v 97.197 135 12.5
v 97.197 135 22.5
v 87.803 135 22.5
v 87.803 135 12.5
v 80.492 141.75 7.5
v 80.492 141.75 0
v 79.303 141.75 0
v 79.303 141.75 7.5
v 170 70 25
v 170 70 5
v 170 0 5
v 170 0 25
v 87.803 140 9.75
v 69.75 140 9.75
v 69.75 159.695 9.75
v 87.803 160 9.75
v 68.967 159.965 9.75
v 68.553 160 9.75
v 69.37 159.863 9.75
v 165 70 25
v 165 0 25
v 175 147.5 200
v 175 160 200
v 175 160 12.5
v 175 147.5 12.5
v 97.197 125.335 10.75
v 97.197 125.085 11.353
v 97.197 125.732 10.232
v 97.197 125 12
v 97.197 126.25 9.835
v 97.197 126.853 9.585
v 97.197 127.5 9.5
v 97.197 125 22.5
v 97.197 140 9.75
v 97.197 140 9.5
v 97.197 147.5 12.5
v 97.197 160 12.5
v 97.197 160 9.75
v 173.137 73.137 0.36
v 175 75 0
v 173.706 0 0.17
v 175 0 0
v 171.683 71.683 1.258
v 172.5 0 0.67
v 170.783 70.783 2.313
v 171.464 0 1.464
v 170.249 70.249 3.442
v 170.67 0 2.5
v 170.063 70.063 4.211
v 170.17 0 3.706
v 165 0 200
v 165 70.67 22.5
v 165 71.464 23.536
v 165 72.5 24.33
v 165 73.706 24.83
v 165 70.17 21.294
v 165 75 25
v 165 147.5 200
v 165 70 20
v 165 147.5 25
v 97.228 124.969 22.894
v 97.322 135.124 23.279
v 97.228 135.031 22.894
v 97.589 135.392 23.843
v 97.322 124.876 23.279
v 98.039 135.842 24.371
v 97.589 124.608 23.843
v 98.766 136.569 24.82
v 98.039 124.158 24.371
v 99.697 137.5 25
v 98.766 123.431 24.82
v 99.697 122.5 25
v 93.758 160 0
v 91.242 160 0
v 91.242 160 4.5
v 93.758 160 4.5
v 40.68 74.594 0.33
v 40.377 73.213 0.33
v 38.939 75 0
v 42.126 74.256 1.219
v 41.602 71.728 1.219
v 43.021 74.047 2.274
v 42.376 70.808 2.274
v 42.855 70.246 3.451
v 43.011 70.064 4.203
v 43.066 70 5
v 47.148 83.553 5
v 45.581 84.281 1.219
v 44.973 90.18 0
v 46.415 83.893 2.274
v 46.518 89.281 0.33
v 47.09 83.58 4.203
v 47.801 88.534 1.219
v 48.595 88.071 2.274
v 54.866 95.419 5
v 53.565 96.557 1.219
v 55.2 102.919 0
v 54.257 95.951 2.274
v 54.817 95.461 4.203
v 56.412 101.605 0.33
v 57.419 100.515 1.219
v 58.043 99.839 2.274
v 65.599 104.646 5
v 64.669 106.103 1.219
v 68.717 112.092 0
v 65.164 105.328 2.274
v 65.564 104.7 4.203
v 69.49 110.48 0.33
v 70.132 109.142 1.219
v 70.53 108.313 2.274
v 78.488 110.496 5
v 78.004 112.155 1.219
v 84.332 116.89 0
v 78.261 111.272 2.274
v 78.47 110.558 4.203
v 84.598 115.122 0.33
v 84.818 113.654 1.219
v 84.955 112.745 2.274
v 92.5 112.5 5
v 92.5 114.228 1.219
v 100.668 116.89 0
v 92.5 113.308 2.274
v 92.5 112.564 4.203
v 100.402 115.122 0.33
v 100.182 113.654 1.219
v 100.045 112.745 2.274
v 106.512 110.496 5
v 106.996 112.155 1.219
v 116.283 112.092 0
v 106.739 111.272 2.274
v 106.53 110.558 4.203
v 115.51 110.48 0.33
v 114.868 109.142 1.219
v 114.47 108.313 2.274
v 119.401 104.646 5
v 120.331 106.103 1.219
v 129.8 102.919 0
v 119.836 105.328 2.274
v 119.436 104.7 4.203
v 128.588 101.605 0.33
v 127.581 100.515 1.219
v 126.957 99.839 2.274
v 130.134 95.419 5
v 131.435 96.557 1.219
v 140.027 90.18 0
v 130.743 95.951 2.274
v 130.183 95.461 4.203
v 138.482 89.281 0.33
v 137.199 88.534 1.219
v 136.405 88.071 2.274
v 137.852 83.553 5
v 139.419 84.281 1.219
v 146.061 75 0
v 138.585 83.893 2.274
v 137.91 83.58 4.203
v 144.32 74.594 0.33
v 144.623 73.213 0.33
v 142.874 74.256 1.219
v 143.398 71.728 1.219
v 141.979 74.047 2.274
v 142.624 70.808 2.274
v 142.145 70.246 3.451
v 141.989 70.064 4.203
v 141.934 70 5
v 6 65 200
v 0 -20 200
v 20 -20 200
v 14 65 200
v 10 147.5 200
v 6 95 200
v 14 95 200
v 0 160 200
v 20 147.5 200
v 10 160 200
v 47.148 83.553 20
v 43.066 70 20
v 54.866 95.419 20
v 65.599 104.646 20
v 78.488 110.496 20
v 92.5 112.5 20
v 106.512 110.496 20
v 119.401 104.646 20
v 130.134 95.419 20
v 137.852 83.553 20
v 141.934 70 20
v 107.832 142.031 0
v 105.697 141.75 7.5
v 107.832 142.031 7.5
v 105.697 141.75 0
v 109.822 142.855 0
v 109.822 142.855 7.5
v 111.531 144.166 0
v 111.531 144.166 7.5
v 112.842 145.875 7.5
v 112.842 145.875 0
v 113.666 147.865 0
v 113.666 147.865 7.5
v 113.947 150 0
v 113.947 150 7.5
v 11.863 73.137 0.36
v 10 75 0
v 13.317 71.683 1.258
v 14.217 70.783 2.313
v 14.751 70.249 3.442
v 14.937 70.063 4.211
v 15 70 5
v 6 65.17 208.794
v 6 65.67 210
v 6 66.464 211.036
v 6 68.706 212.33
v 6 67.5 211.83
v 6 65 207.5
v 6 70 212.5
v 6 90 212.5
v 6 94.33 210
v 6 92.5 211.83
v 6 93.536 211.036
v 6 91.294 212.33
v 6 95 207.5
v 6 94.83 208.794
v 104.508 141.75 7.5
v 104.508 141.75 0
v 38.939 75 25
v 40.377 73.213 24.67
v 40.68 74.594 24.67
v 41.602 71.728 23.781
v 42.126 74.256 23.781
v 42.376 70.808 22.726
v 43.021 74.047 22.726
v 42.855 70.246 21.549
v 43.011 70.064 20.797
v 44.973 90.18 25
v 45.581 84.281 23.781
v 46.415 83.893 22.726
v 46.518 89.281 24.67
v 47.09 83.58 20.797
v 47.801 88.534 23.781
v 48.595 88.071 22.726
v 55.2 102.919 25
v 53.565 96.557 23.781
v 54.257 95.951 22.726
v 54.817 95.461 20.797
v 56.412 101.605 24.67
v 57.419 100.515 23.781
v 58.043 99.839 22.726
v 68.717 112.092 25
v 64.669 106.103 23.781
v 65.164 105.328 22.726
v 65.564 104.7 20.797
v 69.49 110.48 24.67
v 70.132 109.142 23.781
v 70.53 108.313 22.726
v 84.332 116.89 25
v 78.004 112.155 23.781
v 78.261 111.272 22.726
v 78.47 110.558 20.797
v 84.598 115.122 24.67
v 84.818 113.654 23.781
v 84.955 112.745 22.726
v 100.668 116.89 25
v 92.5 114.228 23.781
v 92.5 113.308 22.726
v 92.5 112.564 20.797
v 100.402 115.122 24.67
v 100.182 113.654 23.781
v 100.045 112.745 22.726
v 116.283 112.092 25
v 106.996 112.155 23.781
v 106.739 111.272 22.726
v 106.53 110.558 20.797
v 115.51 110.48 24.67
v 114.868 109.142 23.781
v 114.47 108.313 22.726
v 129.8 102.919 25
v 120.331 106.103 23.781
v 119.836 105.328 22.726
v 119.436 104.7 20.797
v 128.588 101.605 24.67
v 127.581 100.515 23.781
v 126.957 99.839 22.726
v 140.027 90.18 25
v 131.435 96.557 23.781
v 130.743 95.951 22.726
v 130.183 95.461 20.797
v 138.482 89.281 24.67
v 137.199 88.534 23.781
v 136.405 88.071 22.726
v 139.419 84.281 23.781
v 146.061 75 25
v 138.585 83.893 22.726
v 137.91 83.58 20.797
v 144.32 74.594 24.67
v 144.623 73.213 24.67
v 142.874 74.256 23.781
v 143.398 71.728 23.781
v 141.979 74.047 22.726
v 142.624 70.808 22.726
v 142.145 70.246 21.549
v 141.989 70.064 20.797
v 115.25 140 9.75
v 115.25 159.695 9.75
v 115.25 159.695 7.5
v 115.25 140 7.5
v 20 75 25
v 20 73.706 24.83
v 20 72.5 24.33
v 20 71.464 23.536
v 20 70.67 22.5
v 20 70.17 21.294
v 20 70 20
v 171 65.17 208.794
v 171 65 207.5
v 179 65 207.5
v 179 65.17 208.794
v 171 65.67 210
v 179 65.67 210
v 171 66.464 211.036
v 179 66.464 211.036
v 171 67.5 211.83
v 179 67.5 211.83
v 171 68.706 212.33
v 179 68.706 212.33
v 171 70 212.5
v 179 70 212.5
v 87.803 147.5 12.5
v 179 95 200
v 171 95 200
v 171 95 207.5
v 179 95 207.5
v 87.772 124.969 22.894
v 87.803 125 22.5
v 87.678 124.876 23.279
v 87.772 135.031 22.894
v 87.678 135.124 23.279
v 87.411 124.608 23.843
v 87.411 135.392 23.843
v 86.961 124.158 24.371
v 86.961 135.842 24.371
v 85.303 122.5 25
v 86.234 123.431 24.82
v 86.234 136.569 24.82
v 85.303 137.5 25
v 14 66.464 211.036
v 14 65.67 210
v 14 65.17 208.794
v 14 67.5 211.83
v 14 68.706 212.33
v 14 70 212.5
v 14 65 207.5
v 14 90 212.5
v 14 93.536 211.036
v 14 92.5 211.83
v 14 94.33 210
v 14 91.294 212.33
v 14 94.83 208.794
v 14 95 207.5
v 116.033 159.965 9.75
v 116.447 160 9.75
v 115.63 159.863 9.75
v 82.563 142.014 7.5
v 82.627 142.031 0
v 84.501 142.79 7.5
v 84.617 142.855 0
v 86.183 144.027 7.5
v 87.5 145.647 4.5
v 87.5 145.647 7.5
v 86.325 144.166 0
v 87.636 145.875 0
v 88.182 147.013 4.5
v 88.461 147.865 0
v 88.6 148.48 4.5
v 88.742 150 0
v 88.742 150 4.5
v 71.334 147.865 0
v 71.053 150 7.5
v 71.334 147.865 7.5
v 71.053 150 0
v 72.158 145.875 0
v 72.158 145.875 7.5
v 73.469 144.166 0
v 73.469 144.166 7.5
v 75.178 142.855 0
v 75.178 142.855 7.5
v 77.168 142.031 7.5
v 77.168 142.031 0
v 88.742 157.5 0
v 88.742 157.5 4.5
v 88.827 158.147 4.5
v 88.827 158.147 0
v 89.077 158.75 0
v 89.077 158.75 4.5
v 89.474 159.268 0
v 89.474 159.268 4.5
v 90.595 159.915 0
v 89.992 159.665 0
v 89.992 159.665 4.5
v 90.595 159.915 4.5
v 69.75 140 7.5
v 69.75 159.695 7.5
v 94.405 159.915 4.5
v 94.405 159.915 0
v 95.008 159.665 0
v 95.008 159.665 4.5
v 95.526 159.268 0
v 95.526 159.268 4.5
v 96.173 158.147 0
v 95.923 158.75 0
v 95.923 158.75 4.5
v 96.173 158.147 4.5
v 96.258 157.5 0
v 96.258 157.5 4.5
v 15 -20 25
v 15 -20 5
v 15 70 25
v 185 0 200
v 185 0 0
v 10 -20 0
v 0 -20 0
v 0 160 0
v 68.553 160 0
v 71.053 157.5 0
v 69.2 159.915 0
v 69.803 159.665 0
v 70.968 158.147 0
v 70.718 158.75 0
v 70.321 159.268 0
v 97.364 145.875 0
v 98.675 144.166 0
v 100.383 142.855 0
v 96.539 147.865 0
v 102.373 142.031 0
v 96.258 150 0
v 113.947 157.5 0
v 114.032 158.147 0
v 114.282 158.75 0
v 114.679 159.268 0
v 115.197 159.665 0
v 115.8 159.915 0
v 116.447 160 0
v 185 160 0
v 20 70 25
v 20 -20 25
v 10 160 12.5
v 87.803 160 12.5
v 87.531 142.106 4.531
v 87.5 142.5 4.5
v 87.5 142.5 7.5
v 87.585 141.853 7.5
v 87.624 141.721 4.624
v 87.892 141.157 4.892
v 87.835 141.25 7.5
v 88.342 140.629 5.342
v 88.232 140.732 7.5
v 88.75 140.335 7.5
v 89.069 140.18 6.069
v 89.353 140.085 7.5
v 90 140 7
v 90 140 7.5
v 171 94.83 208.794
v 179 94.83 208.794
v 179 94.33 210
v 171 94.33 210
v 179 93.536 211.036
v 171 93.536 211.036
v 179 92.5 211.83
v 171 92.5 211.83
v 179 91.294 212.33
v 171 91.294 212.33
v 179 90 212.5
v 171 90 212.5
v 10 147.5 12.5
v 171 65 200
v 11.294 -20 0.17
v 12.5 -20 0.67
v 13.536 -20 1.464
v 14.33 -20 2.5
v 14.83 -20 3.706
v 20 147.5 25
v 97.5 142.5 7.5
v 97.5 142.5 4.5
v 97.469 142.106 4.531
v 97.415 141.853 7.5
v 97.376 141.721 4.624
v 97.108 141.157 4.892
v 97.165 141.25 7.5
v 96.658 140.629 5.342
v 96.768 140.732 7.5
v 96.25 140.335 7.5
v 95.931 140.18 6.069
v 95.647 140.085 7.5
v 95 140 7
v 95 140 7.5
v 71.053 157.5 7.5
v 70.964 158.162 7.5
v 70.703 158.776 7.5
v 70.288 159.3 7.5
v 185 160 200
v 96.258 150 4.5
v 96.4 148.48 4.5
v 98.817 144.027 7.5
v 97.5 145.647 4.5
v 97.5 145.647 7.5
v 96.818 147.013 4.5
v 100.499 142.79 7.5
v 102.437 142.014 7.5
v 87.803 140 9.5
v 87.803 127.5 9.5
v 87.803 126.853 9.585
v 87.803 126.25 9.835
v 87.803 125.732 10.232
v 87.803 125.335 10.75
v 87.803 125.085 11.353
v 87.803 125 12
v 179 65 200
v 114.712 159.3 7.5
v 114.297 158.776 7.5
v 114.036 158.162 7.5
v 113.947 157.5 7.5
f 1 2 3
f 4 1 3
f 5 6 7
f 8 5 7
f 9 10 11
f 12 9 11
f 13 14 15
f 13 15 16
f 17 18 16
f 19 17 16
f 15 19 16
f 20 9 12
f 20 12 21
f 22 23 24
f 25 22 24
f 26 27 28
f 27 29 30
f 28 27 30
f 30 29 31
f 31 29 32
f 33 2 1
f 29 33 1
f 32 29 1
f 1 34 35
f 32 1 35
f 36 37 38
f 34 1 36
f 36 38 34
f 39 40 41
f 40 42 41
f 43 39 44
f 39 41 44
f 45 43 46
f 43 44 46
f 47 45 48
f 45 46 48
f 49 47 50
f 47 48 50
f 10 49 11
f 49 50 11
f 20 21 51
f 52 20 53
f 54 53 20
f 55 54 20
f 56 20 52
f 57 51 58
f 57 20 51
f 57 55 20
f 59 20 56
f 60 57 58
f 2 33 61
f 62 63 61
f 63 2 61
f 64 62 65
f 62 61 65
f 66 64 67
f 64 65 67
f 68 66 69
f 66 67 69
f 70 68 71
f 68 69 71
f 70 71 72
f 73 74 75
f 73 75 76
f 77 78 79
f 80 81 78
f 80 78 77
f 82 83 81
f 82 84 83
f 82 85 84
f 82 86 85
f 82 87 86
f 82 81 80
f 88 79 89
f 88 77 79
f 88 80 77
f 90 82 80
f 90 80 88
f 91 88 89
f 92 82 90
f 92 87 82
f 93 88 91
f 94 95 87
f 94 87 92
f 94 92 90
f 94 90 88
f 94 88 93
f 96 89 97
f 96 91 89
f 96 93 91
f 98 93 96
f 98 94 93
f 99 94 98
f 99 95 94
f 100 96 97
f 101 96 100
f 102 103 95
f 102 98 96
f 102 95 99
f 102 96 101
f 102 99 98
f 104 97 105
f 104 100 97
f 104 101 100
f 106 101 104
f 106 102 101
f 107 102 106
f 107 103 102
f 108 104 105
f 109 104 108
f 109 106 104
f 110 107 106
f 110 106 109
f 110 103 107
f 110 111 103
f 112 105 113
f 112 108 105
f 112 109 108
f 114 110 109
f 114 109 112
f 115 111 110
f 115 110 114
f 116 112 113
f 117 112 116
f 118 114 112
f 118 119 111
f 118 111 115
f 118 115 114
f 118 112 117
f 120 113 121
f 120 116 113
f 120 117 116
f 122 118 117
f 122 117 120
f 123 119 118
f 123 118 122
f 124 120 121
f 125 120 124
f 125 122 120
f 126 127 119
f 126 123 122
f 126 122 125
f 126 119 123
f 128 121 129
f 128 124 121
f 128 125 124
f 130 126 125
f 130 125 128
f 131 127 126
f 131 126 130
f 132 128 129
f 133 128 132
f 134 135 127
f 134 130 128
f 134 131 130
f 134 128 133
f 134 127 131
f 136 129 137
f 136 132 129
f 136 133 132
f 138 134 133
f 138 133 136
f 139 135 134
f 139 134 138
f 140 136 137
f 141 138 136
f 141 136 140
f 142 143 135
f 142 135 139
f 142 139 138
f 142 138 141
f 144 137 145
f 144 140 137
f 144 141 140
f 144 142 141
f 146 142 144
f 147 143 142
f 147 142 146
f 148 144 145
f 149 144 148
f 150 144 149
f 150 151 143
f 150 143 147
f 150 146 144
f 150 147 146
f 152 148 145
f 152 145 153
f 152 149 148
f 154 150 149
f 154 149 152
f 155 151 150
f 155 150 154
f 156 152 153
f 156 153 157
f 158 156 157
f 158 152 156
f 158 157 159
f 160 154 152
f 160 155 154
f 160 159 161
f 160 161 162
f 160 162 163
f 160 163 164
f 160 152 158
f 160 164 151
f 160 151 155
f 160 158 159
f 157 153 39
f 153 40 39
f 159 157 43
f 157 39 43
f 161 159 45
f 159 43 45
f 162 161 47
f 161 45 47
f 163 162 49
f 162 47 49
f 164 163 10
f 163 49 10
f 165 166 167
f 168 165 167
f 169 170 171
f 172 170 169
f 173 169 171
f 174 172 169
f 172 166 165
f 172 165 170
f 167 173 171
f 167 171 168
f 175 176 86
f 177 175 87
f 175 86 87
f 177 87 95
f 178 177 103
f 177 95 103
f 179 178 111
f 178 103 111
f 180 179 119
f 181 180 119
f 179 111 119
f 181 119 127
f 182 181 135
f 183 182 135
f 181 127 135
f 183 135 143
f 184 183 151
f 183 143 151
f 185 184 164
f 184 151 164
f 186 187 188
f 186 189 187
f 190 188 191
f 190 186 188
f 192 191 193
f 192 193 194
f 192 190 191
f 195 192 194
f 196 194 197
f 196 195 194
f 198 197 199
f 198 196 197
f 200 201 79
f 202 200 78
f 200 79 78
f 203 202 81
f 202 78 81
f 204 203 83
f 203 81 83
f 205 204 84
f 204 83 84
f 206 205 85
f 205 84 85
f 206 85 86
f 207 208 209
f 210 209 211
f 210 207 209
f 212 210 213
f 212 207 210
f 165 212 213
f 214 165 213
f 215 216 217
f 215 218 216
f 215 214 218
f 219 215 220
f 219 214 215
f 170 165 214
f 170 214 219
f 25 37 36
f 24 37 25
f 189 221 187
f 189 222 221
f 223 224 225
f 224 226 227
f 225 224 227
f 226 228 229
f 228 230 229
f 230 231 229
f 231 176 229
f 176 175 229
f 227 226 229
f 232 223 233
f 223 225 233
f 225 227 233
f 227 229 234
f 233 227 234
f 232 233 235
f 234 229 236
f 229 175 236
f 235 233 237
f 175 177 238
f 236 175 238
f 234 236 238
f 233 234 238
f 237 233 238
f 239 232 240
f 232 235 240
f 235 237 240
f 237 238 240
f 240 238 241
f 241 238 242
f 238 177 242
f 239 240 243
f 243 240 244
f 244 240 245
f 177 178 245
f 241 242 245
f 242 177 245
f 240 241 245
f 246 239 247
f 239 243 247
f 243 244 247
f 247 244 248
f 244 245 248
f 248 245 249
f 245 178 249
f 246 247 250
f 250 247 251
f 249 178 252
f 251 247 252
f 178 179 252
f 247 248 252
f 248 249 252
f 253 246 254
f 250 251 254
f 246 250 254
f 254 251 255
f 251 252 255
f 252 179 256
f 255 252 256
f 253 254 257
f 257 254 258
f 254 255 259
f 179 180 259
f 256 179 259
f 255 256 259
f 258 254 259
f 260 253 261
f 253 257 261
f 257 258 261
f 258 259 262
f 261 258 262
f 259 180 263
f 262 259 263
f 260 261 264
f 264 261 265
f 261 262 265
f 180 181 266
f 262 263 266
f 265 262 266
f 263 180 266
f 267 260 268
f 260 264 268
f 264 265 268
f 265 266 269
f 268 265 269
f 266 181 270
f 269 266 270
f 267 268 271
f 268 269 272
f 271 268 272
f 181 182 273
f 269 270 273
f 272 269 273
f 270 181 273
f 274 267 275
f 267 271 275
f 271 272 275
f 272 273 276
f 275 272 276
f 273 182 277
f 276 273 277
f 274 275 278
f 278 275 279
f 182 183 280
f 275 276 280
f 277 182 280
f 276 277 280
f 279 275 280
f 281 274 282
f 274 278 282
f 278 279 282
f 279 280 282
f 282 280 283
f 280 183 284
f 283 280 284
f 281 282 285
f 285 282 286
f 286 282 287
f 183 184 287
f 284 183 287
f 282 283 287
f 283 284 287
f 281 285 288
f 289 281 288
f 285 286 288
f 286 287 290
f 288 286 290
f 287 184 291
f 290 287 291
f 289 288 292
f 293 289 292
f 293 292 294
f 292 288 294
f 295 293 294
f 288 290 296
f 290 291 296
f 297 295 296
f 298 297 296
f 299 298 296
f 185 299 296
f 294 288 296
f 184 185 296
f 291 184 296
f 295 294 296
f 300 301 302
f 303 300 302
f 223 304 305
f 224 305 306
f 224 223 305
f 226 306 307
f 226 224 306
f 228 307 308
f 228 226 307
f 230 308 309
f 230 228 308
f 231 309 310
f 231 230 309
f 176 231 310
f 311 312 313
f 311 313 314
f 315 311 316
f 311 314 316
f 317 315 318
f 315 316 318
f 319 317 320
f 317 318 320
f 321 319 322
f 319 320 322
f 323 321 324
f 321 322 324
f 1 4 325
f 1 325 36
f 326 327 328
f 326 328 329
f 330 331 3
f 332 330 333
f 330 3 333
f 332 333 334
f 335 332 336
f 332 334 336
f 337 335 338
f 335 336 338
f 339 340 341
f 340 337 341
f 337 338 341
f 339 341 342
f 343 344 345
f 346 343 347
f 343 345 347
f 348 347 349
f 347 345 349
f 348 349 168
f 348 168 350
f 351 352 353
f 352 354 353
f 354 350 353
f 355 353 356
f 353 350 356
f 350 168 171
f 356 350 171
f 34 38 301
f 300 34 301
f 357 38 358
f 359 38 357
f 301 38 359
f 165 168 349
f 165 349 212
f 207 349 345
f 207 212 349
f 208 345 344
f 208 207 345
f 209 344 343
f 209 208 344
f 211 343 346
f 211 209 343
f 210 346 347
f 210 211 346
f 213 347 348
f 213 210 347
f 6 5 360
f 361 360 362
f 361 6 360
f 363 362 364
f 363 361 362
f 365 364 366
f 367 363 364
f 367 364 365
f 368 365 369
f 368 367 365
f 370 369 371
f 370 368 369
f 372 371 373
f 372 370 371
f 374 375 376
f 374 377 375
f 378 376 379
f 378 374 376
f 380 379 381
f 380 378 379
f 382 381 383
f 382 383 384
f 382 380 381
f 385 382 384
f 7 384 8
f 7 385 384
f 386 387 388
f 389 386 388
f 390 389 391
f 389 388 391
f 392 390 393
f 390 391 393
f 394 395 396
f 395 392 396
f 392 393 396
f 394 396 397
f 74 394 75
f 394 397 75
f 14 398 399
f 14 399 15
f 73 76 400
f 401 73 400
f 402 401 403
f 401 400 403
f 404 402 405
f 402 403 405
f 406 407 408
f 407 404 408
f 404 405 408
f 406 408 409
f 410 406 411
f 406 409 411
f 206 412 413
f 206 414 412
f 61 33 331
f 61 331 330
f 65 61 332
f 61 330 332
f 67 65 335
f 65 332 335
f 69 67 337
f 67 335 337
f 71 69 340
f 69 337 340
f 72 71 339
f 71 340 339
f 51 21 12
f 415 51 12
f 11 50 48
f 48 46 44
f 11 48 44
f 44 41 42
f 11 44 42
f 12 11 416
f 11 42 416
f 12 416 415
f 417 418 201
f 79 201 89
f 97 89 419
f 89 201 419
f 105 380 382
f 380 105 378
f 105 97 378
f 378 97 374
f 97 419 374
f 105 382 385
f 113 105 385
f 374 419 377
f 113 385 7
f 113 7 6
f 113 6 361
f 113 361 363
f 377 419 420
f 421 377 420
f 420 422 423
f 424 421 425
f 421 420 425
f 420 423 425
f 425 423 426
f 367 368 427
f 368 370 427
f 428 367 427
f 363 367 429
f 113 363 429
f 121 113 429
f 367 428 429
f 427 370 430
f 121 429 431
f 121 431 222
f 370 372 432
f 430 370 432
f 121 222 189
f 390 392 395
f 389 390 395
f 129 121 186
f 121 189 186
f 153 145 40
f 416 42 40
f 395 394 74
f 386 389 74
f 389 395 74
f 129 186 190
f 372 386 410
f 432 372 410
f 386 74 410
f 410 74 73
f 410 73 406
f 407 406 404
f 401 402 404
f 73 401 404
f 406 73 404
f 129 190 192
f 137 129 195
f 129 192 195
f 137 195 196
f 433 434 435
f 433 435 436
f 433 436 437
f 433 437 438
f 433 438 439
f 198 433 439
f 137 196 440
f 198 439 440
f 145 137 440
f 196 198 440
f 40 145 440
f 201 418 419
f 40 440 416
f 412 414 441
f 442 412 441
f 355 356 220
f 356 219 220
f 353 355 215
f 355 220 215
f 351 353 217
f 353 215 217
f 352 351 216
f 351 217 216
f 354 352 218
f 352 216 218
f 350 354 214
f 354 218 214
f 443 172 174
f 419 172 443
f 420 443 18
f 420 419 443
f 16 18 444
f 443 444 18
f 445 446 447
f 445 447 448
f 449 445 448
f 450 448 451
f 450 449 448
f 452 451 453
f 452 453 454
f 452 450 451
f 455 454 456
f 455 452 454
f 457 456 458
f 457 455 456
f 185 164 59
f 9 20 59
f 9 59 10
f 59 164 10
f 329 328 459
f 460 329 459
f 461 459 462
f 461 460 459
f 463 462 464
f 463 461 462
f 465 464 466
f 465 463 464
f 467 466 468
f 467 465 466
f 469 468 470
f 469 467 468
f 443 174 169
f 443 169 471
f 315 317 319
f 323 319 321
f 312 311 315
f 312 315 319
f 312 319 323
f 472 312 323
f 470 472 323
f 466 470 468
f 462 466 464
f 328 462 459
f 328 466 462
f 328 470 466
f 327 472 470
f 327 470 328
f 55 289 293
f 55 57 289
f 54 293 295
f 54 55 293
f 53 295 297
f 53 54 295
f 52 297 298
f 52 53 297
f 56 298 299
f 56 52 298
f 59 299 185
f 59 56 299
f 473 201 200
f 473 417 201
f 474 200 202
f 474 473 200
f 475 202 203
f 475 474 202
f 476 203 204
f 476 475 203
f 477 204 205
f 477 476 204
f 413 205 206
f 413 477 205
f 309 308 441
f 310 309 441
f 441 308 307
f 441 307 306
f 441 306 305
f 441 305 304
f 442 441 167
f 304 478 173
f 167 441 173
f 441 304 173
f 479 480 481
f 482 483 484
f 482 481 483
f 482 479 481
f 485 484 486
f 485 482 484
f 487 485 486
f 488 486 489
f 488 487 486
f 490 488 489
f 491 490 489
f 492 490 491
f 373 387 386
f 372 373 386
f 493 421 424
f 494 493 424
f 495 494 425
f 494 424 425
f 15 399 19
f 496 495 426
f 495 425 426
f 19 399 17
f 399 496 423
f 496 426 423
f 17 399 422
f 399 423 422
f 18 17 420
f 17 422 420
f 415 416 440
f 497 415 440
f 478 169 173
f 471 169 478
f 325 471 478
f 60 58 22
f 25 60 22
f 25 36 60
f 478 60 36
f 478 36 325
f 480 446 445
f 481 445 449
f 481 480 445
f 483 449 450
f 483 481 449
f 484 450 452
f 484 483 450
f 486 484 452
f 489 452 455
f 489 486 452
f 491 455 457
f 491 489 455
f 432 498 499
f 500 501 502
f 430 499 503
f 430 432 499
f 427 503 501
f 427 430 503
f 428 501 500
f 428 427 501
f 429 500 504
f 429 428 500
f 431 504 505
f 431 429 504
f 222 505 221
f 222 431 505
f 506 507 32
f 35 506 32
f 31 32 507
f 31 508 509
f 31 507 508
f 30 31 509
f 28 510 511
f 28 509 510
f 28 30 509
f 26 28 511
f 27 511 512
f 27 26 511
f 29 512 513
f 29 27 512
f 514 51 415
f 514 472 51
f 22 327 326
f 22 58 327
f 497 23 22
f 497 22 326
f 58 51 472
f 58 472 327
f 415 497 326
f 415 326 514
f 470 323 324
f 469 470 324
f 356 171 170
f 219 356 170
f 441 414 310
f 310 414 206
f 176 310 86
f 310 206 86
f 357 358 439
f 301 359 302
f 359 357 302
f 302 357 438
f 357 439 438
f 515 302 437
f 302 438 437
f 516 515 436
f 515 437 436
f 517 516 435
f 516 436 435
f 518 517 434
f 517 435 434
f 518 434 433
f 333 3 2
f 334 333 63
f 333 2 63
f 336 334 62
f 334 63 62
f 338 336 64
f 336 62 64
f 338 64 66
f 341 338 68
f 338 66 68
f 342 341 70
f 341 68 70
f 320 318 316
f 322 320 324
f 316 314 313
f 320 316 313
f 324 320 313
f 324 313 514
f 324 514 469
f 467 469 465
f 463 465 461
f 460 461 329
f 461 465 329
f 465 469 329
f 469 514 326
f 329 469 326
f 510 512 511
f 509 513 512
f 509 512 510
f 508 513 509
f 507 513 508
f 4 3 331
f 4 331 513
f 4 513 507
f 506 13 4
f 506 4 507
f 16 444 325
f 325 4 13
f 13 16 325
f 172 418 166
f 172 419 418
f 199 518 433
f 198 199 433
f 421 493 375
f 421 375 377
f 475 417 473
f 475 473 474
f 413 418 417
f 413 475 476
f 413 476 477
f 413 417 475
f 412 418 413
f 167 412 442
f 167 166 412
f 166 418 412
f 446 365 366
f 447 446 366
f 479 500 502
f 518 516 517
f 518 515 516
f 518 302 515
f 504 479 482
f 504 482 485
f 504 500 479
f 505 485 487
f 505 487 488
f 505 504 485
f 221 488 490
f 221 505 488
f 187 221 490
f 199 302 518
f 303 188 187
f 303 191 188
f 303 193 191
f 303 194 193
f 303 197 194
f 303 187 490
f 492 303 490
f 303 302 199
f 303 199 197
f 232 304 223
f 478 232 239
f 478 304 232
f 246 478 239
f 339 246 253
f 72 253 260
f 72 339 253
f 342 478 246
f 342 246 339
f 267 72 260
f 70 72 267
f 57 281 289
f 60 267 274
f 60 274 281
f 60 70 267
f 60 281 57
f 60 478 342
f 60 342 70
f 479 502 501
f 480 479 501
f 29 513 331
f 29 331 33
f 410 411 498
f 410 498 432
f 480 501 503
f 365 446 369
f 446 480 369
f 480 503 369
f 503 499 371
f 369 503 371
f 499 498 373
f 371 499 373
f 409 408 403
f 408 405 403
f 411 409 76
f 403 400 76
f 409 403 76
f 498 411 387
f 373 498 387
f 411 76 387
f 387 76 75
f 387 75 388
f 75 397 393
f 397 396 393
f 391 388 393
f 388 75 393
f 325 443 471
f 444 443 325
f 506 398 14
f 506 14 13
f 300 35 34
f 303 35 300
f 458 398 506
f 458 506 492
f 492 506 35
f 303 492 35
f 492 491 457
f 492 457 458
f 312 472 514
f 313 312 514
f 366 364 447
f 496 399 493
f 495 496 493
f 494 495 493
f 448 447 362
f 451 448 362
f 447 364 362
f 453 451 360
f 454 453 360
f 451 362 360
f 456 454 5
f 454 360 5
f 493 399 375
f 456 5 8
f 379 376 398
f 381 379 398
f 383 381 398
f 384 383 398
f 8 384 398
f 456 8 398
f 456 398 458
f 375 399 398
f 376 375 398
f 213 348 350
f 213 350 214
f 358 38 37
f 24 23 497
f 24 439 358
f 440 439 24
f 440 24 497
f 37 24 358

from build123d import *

# Parameters (mm, degrees)
SKETCH1_W            = 185
SKETCH1_H            = 160
BOSS_EXTRUDE1_DEPTH  = 25
SKETCH2_W            = 20
SKETCH2_H            = 160
BOSS_EXTRUDE2_DEPTH  = 175
SKETCH5_W            = 20
SKETCH5_H            = 200
BOSS_EXTRUDE3_DEPTH  = 20
CUT_EXTRUDE1_DEPTH   = 25
SKETCH6_W            = 5
SKETCH6_H            = 25
CUT_EXTRUDE2_DEPTH   = 20
FILLET2_R            = 5
SKETCH7_W            = 8
SKETCH7_H            = 30
BOSS_EXTRUDE4_DEPTH  = 12.5
FILLET3_R            = 5
FILLET3_OF_MIRROR1_R = 5
SKETCH8_W            = 165
SKETCH8_H            = 187.5
CUT_EXTRUDE3_DEPTH   = 12.5
SKETCH10_R           = 8.25
CUT_EXTRUDE4_DEPTH   = 7.5
CUT_EXTRUDE5_DEPTH   = 20
SKETCH12_W           = 17.688824297
SKETCH12_H           = 7.5
CUT_EXTRUDE6_DEPTH   = 18.25
FILLET4_R            = 8.25
FILLET4_OF_MIRROR2_R = 8.25
SKETCH14_W           = 9.39420862
SKETCH14_H           = 3
CUT_EXTRUDE7_DEPTH   = 35
SKETCH15_W           = 9.39420862
SKETCH15_H           = 10
CUT_EXTRUDE8_DEPTH   = 30
FILLET5_R            = 2.5


with BuildPart() as part:
    # Sketch1 → Boss-Extrude1 (new body)
    with BuildSketch(Plane.XY):
        with Locations((92.5, 80)):
            Rectangle(SKETCH1_W, SKETCH1_H)
    extrude(amount=BOSS_EXTRUDE1_DEPTH)

    # Sketch2 → Boss-Extrude2 (add)
    with BuildSketch(Plane.XY.offset(25)):
        with Locations((10, 80)):
            Rectangle(SKETCH2_W, SKETCH2_H)
        with Locations((175, 80)):
            Rectangle(SKETCH2_W, SKETCH2_H)
    extrude(amount=BOSS_EXTRUDE2_DEPTH)

    # Sketch5 → Boss-Extrude3 (add)
    with BuildSketch(Plane.XZ):
        with Locations((10, 100)):
            Rectangle(SKETCH5_W, SKETCH5_H)
    extrude(amount=BOSS_EXTRUDE3_DEPTH)

    # Sketch3 → Cut-Extrude1 (cut)
    with BuildSketch(Plane(origin=(0, 0, 0), x_dir=(-1, 0, 0), z_dir=(0, 0, -1))):
        with BuildLine():
            Line((-170, 0), (-15, 0))
            Line((-15, 0), (-15, 70))
            Line((-15, 70), (-43.065700167, 70))
            ThreePointArc((-43.065700167, 70), (-92.5, 112.5), (-141.934299833, 70))
            Line((-141.934299833, 70), (-170, 70))
            Line((-170, 70), (-170, 0))
        make_face()
    extrude(amount=-CUT_EXTRUDE1_DEPTH, mode=Mode.SUBTRACT)

    # Sketch6 → Cut-Extrude2 (cut)
    with BuildSketch(Plane(origin=(0, 0, 0), x_dir=(1, 0, 0), z_dir=(0, 1, 0))):
        with Locations((17.5, -12.5)):
            Rectangle(SKETCH6_W, SKETCH6_H)
    extrude(amount=-CUT_EXTRUDE2_DEPTH, mode=Mode.SUBTRACT)

    # Fillet2
    fillet2_edges = [part.edges().sort_by_distance(p)[0] for p in [
        (153.467149917, 70, 25),
        (92.5, 112.5, 25),
        (31.532850083, 70, 25),
        (170, 35, 0),
        (15, 25, 0),
        (29.032850083, 70, 0),
        (92.5, 112.5, 0),
        (155.967149917, 70, 0),
    ]]
    fillet(fillet2_edges, radius=FILLET2_R)

    # Sketch7 → Boss-Extrude4 (add)
    with BuildSketch(Plane.XY.offset(200)):
        with Locations((175, 80)):
            Rectangle(SKETCH7_W, SKETCH7_H)
    boss_extrude4 = extrude(amount=BOSS_EXTRUDE4_DEPTH)

    # Fillet3
    fillet3_edges = [part.edges().sort_by_distance(p)[0] for p in [
        (175, 95, 212.5),
        (175, 65, 212.5),
    ]]
    fillet(fillet3_edges, radius=FILLET3_R)

    # Mirror1: Boss-Extrude4 across plane
    add(boss_extrude4.mirror(Plane.ZY.offset(-92.5)))

    # Fillet3 of Mirror1
    fillet3_of_mirror1_edges = [part.edges().sort_by_distance(p)[0] for p in [
        (10, 95, 212.5),
        (10, 65, 212.5),
    ]]
    fillet(fillet3_of_mirror1_edges, radius=FILLET3_OF_MIRROR1_R)

    # Sketch8 → Cut-Extrude3 (cut)
    with BuildSketch(Plane(origin=(0, 160, 0), x_dir=(1, 0, 0), z_dir=(0, 1, 0))):
        with Locations((92.5, -106.25)):
            Rectangle(SKETCH8_W, SKETCH8_H)
    extrude(amount=-CUT_EXTRUDE3_DEPTH, mode=Mode.SUBTRACT)

    # Sketch10 → Cut-Extrude4 (cut)
    with BuildSketch(Plane(origin=(0, 0, 0), x_dir=(-1, 0, 0), z_dir=(0, 0, -1))):
        with Locations((-105, 150)):
            Circle(SKETCH10_R)
        with Locations(Location((-80, 150, 0), (0, 0, 180))):
            Circle(SKETCH10_R)
    extrude(amount=-CUT_EXTRUDE4_DEPTH, mode=Mode.SUBTRACT)

    # Sketch11 → Cut-Extrude5 (cut)
    with BuildSketch(Plane(origin=(0, 160, 0), x_dir=(1, 0, 0), z_dir=(0, 1, 0))):
        Polygon((87.5, -7.5), (69.75, -7.5), (69.75, -9.75), (115.25, -9.75), (115.25, -7.5), (97.5, -7.5), (97.5, -4.5), (87.5, -4.5), align=None)
    extrude(amount=-CUT_EXTRUDE5_DEPTH, mode=Mode.SUBTRACT)

    # Sketch12 → Cut-Extrude6 (cut)
    with BuildSketch(Plane(origin=(0, 160, 0), x_dir=(1, 0, 0), z_dir=(0, 1, 0))):
        with Locations((105.102762798, -3.75)):
            Rectangle(SKETCH12_W, SKETCH12_H)
    cut_extrude6 = extrude(amount=-CUT_EXTRUDE6_DEPTH, mode=Mode.SUBTRACT)

    # Fillet4
    fillet4_edges = [part.edges().sort_by_distance(p)[0] for p in [
        (96.258350649, 141.75, 2.25),
        (113.947174946, 141.75, 3.75),
    ]]
    fillet(fillet4_edges, radius=FILLET4_R)

    # Mirror2: Cut-Extrude6 across plane
    add(cut_extrude6.mirror(Plane.ZY.offset(-92.5)), mode=Mode.SUBTRACT)

    # Fillet4 of Mirror2
    fillet4_of_mirror2_edges = [part.edges().sort_by_distance(p)[0] for p in [
        (88.741649351, 141.75, 2.25),
        (71.052825054, 141.75, 3.75),
    ]]
    fillet(fillet4_of_mirror2_edges, radius=FILLET4_OF_MIRROR2_R)

    # Sketch14 → Cut-Extrude7 (cut)
    with BuildSketch(Plane(origin=(0, 160, 0), x_dir=(1, 0, 0), z_dir=(0, 1, 0))):
        with Locations((92.5, -11)):
            Rectangle(SKETCH14_W, SKETCH14_H)
    extrude(amount=-CUT_EXTRUDE7_DEPTH, mode=Mode.SUBTRACT)

    # Sketch15 → Cut-Extrude8 (cut)
    with BuildSketch(Plane(origin=(0, 0, 12.5), x_dir=(-1, 0, 0), z_dir=(0, 0, -1))):
        with Locations((-92.5, 130)):
            Rectangle(SKETCH15_W, SKETCH15_H)
    extrude(amount=-CUT_EXTRUDE8_DEPTH, mode=Mode.SUBTRACT)

    # Fillet5
    # the kernel refuses this fillet: 2.5 mm, written as the material it adds along each edge
    with BuildSketch(Plane(origin=(87.5, 140, 4.5), x_dir=(0, 1, 0), z_dir=(0, 0, 1)), Plane(origin=(97.5, 140, 7.5), x_dir=(0, 1, 0), z_dir=(0, 0, -1))) as fillet5_piece_1:
        with BuildLine():
            CenterArc((FILLET5_R, -FILLET5_R), FILLET5_R, 90, 90)
            Line((0, -FILLET5_R), (0, 0))
            Line((0, 0), (FILLET5_R, 0))
        make_face()
    extrude(amount=3)
    with BuildSketch(Plane(origin=(97.5, 140, 4.5), x_dir=(0, 1, 0), z_dir=(-1, 0, 0))) as fillet5_piece_2:
        with BuildLine():
            CenterArc((FILLET5_R, -FILLET5_R), FILLET5_R, 90, 90)
            Line((0, -FILLET5_R), (0, 0))
            Line((0, 0), (FILLET5_R, 0))
        make_face()
    extrude(amount=10)
    with BuildSketch(Plane(origin=(103.44710431, 125, 9.5), x_dir=(0, 1, 0), z_dir=(-1, 0, 0))) as fillet5_piece_3:
        with BuildLine():
            CenterArc((FILLET5_R, -FILLET5_R), FILLET5_R, 90, 90)
            Line((0, -FILLET5_R), (0, 0))
            Line((0, 0), (FILLET5_R, 0))
        make_face()
    extrude(amount=21.89420862)
    # the kernel refuses this fillet: 2.5 mm, written as the material it takes off along each edge
    with BuildSketch(Plane(origin=(96.258350649, 160, 10.75), x_dir=(0, -1, 0), z_dir=(0, 0, -1)), Plane(origin=(88.741649351, 160, 10.75), x_dir=(1, 0, 0), z_dir=(0, 0, -1))) as fillet5_2_piece_1:
        with BuildLine():
            CenterArc((FILLET5_R, FILLET5_R), FILLET5_R, 180, 90)
            Line((0, FILLET5_R), (0, 0))
            Line((0, 0), (FILLET5_R, 0))
        make_face()
    extrude(amount=17, mode=Mode.SUBTRACT)
    with BuildSketch(Plane(origin=(113.947174946, 160, -6.25), x_dir=(1, 0, 0), z_dir=(0, 0, 1))) as fillet5_2_piece_2_section:
        with BuildLine():
            CenterArc((FILLET5_R, -FILLET5_R), FILLET5_R, 90, 90)
            Line((0, -FILLET5_R), (0, 0))
            Line((0, 0), (FILLET5_R, 0))
        make_face()
    fillet5_2_piece_2 = extrude(amount=20, mode=Mode.PRIVATE)
    fillet5_2_piece_2 = split(fillet5_2_piece_2, bisect_by=Plane(origin=(113.947174946, 160, 9.75), z_dir=(0, 0, -1)), keep=Keep.TOP, mode=Mode.PRIVATE)
    add(fillet5_2_piece_2, mode=Mode.SUBTRACT)
    with BuildSketch(Plane(origin=(71.052825054, 160, -6.25), x_dir=(-1, 0, 0), z_dir=(0, 0, 1))) as fillet5_2_piece_3_section:
        with BuildLine():
            CenterArc((FILLET5_R, FILLET5_R), FILLET5_R, 180, 90)
            Line((0, FILLET5_R), (0, 0))
            Line((0, 0), (FILLET5_R, 0))
        make_face()
    fillet5_2_piece_3 = extrude(amount=20, mode=Mode.PRIVATE)
    fillet5_2_piece_3 = split(fillet5_2_piece_3, bisect_by=Plane(origin=(71.052825054, 160, 9.75), z_dir=(0, 0, -1)), keep=Keep.TOP, mode=Mode.PRIVATE)
    add(fillet5_2_piece_3, mode=Mode.SUBTRACT)
    with BuildSketch(Plane(origin=(97.19710431, 125, 25), x_dir=(0, 0, -1), z_dir=(0, 1, 0)), Plane(origin=(87.80289569, 135, 25), x_dir=(0, 0, -1), z_dir=(0, -1, 0))) as fillet5_2_piece_4:
        with BuildLine():
            CenterArc((FILLET5_R, -FILLET5_R), FILLET5_R, 90, 90)
            Line((0, -FILLET5_R), (0, 0))
            Line((0, 0), (FILLET5_R, 0))
        make_face()
    extrude(amount=10, mode=Mode.SUBTRACT)
    with BuildSketch(Plane(origin=(97.19710431, 135, 25), x_dir=(0, 0, -1), z_dir=(-1, 0, 0)), Plane(origin=(87.80289569, 125, 25), x_dir=(0, 0, -1), z_dir=(1, 0, 0))) as fillet5_2_piece_5:
        with BuildLine():
            CenterArc((FILLET5_R, -FILLET5_R), FILLET5_R, 90, 90)
            Line((0, -FILLET5_R), (0, 0))
            Line((0, 0), (FILLET5_R, 0))
        make_face()
    extrude(amount=9.39420862, mode=Mode.SUBTRACT)
    with BuildSketch(Plane(origin=(97.19710431, 118.75, 25), x_dir=(0, 0, -1), z_dir=(0, 1, 0))) as fillet5_2_piece_6a_section:
        with BuildLine():
            CenterArc((FILLET5_R, -FILLET5_R), FILLET5_R, 90, 90)
            Line((0, -FILLET5_R), (0, 0))
            Line((0, 0), (FILLET5_R, 0))
        make_face()
    fillet5_2_piece_6a = extrude(amount=16.25, mode=Mode.PRIVATE)
    fillet5_2_piece_6a = split(fillet5_2_piece_6a, bisect_by=Plane(origin=(97.19710431, 125, 25), z_dir=(0, -1, 0)), keep=Keep.TOP, mode=Mode.PRIVATE)
    with BuildSketch(Plane(origin=(87.80289569, 125, 25), x_dir=(0, 0, -1), z_dir=(1, 0, 0))) as fillet5_2_piece_6b_section:
        with BuildLine():
            CenterArc((FILLET5_R, -FILLET5_R), FILLET5_R, 90, 90)
            Line((0, -FILLET5_R), (0, 0))
            Line((0, 0), (FILLET5_R, 0))
        make_face()
    fillet5_2_piece_6b = extrude(amount=15.64420862, mode=Mode.PRIVATE)
    fillet5_2_piece_6b = split(fillet5_2_piece_6b, bisect_by=Plane(origin=(97.19710431, 125, 25), z_dir=(1, 0, 0)), keep=Keep.TOP, mode=Mode.PRIVATE)
    fillet5_2_piece_6 = fillet5_2_piece_6a & fillet5_2_piece_6b
    add(fillet5_2_piece_6, mode=Mode.SUBTRACT)
    with BuildSketch(Plane(origin=(97.19710431, 125, 25), x_dir=(0, 0, -1), z_dir=(0, 1, 0))) as fillet5_2_piece_7a_section:
        with BuildLine():
            CenterArc((FILLET5_R, -FILLET5_R), FILLET5_R, 90, 90)
            Line((0, -FILLET5_R), (0, 0))
            Line((0, 0), (FILLET5_R, 0))
        make_face()
    fillet5_2_piece_7a = extrude(amount=16.25, mode=Mode.PRIVATE)
    fillet5_2_piece_7a = split(fillet5_2_piece_7a, bisect_by=Plane(origin=(97.19710431, 135, 25), z_dir=(0, 1, 0)), keep=Keep.TOP, mode=Mode.PRIVATE)
    with BuildSketch(Plane(origin=(103.44710431, 135, 25), x_dir=(0, 0, -1), z_dir=(-1, 0, 0))) as fillet5_2_piece_7b_section:
        with BuildLine():
            CenterArc((FILLET5_R, -FILLET5_R), FILLET5_R, 90, 90)
            Line((0, -FILLET5_R), (0, 0))
            Line((0, 0), (FILLET5_R, 0))
        make_face()
    fillet5_2_piece_7b = extrude(amount=15.64420862, mode=Mode.PRIVATE)
    fillet5_2_piece_7b = split(fillet5_2_piece_7b, bisect_by=Plane(origin=(97.19710431, 135, 25), z_dir=(1, 0, 0)), keep=Keep.TOP, mode=Mode.PRIVATE)
    fillet5_2_piece_7 = fillet5_2_piece_7a & fillet5_2_piece_7b
    add(fillet5_2_piece_7, mode=Mode.SUBTRACT)
    with BuildSketch(Plane(origin=(97.19710431, 135, 25), x_dir=(0, 0, -1), z_dir=(-1, 0, 0))) as fillet5_2_piece_8a_section:
        with BuildLine():
            CenterArc((FILLET5_R, -FILLET5_R), FILLET5_R, 90, 90)
            Line((0, -FILLET5_R), (0, 0))
            Line((0, 0), (FILLET5_R, 0))
        make_face()
    fillet5_2_piece_8a = extrude(amount=15.64420862, mode=Mode.PRIVATE)
    fillet5_2_piece_8a = split(fillet5_2_piece_8a, bisect_by=Plane(origin=(87.80289569, 135, 25), z_dir=(-1, 0, 0)), keep=Keep.TOP, mode=Mode.PRIVATE)
    with BuildSketch(Plane(origin=(87.80289569, 141.25, 25), x_dir=(0, 0, -1), z_dir=(0, -1, 0))) as fillet5_2_piece_8b_section:
        with BuildLine():
            CenterArc((FILLET5_R, -FILLET5_R), FILLET5_R, 90, 90)
            Line((0, -FILLET5_R), (0, 0))
            Line((0, 0), (FILLET5_R, 0))
        make_face()
    fillet5_2_piece_8b = extrude(amount=16.25, mode=Mode.PRIVATE)
    fillet5_2_piece_8b = split(fillet5_2_piece_8b, bisect_by=Plane(origin=(87.80289569, 135, 25), z_dir=(0, 1, 0)), keep=Keep.TOP, mode=Mode.PRIVATE)
    fillet5_2_piece_8 = fillet5_2_piece_8a & fillet5_2_piece_8b
    add(fillet5_2_piece_8, mode=Mode.SUBTRACT)
    with BuildSketch(Plane(origin=(87.80289569, 135, 25), x_dir=(0, 0, -1), z_dir=(0, -1, 0))) as fillet5_2_piece_9a_section:
        with BuildLine():
            CenterArc((FILLET5_R, -FILLET5_R), FILLET5_R, 90, 90)
            Line((0, -FILLET5_R), (0, 0))
            Line((0, 0), (FILLET5_R, 0))
        make_face()
    fillet5_2_piece_9a = extrude(amount=16.25, mode=Mode.PRIVATE)
    fillet5_2_piece_9a = split(fillet5_2_piece_9a, bisect_by=Plane(origin=(87.80289569, 125, 25), z_dir=(0, -1, 0)), keep=Keep.TOP, mode=Mode.PRIVATE)
    with BuildSketch(Plane(origin=(81.55289569, 125, 25), x_dir=(0, 0, -1), z_dir=(1, 0, 0))) as fillet5_2_piece_9b_section:
        with BuildLine():
            CenterArc((FILLET5_R, -FILLET5_R), FILLET5_R, 90, 90)
            Line((0, -FILLET5_R), (0, 0))
            Line((0, 0), (FILLET5_R, 0))
        make_face()
    fillet5_2_piece_9b = extrude(amount=15.64420862, mode=Mode.PRIVATE)
    fillet5_2_piece_9b = split(fillet5_2_piece_9b, bisect_by=Plane(origin=(87.80289569, 125, 25), z_dir=(-1, 0, 0)), keep=Keep.TOP, mode=Mode.PRIVATE)
    fillet5_2_piece_9 = fillet5_2_piece_9a & fillet5_2_piece_9b
    add(fillet5_2_piece_9, mode=Mode.SUBTRACT)


solid = part.part
